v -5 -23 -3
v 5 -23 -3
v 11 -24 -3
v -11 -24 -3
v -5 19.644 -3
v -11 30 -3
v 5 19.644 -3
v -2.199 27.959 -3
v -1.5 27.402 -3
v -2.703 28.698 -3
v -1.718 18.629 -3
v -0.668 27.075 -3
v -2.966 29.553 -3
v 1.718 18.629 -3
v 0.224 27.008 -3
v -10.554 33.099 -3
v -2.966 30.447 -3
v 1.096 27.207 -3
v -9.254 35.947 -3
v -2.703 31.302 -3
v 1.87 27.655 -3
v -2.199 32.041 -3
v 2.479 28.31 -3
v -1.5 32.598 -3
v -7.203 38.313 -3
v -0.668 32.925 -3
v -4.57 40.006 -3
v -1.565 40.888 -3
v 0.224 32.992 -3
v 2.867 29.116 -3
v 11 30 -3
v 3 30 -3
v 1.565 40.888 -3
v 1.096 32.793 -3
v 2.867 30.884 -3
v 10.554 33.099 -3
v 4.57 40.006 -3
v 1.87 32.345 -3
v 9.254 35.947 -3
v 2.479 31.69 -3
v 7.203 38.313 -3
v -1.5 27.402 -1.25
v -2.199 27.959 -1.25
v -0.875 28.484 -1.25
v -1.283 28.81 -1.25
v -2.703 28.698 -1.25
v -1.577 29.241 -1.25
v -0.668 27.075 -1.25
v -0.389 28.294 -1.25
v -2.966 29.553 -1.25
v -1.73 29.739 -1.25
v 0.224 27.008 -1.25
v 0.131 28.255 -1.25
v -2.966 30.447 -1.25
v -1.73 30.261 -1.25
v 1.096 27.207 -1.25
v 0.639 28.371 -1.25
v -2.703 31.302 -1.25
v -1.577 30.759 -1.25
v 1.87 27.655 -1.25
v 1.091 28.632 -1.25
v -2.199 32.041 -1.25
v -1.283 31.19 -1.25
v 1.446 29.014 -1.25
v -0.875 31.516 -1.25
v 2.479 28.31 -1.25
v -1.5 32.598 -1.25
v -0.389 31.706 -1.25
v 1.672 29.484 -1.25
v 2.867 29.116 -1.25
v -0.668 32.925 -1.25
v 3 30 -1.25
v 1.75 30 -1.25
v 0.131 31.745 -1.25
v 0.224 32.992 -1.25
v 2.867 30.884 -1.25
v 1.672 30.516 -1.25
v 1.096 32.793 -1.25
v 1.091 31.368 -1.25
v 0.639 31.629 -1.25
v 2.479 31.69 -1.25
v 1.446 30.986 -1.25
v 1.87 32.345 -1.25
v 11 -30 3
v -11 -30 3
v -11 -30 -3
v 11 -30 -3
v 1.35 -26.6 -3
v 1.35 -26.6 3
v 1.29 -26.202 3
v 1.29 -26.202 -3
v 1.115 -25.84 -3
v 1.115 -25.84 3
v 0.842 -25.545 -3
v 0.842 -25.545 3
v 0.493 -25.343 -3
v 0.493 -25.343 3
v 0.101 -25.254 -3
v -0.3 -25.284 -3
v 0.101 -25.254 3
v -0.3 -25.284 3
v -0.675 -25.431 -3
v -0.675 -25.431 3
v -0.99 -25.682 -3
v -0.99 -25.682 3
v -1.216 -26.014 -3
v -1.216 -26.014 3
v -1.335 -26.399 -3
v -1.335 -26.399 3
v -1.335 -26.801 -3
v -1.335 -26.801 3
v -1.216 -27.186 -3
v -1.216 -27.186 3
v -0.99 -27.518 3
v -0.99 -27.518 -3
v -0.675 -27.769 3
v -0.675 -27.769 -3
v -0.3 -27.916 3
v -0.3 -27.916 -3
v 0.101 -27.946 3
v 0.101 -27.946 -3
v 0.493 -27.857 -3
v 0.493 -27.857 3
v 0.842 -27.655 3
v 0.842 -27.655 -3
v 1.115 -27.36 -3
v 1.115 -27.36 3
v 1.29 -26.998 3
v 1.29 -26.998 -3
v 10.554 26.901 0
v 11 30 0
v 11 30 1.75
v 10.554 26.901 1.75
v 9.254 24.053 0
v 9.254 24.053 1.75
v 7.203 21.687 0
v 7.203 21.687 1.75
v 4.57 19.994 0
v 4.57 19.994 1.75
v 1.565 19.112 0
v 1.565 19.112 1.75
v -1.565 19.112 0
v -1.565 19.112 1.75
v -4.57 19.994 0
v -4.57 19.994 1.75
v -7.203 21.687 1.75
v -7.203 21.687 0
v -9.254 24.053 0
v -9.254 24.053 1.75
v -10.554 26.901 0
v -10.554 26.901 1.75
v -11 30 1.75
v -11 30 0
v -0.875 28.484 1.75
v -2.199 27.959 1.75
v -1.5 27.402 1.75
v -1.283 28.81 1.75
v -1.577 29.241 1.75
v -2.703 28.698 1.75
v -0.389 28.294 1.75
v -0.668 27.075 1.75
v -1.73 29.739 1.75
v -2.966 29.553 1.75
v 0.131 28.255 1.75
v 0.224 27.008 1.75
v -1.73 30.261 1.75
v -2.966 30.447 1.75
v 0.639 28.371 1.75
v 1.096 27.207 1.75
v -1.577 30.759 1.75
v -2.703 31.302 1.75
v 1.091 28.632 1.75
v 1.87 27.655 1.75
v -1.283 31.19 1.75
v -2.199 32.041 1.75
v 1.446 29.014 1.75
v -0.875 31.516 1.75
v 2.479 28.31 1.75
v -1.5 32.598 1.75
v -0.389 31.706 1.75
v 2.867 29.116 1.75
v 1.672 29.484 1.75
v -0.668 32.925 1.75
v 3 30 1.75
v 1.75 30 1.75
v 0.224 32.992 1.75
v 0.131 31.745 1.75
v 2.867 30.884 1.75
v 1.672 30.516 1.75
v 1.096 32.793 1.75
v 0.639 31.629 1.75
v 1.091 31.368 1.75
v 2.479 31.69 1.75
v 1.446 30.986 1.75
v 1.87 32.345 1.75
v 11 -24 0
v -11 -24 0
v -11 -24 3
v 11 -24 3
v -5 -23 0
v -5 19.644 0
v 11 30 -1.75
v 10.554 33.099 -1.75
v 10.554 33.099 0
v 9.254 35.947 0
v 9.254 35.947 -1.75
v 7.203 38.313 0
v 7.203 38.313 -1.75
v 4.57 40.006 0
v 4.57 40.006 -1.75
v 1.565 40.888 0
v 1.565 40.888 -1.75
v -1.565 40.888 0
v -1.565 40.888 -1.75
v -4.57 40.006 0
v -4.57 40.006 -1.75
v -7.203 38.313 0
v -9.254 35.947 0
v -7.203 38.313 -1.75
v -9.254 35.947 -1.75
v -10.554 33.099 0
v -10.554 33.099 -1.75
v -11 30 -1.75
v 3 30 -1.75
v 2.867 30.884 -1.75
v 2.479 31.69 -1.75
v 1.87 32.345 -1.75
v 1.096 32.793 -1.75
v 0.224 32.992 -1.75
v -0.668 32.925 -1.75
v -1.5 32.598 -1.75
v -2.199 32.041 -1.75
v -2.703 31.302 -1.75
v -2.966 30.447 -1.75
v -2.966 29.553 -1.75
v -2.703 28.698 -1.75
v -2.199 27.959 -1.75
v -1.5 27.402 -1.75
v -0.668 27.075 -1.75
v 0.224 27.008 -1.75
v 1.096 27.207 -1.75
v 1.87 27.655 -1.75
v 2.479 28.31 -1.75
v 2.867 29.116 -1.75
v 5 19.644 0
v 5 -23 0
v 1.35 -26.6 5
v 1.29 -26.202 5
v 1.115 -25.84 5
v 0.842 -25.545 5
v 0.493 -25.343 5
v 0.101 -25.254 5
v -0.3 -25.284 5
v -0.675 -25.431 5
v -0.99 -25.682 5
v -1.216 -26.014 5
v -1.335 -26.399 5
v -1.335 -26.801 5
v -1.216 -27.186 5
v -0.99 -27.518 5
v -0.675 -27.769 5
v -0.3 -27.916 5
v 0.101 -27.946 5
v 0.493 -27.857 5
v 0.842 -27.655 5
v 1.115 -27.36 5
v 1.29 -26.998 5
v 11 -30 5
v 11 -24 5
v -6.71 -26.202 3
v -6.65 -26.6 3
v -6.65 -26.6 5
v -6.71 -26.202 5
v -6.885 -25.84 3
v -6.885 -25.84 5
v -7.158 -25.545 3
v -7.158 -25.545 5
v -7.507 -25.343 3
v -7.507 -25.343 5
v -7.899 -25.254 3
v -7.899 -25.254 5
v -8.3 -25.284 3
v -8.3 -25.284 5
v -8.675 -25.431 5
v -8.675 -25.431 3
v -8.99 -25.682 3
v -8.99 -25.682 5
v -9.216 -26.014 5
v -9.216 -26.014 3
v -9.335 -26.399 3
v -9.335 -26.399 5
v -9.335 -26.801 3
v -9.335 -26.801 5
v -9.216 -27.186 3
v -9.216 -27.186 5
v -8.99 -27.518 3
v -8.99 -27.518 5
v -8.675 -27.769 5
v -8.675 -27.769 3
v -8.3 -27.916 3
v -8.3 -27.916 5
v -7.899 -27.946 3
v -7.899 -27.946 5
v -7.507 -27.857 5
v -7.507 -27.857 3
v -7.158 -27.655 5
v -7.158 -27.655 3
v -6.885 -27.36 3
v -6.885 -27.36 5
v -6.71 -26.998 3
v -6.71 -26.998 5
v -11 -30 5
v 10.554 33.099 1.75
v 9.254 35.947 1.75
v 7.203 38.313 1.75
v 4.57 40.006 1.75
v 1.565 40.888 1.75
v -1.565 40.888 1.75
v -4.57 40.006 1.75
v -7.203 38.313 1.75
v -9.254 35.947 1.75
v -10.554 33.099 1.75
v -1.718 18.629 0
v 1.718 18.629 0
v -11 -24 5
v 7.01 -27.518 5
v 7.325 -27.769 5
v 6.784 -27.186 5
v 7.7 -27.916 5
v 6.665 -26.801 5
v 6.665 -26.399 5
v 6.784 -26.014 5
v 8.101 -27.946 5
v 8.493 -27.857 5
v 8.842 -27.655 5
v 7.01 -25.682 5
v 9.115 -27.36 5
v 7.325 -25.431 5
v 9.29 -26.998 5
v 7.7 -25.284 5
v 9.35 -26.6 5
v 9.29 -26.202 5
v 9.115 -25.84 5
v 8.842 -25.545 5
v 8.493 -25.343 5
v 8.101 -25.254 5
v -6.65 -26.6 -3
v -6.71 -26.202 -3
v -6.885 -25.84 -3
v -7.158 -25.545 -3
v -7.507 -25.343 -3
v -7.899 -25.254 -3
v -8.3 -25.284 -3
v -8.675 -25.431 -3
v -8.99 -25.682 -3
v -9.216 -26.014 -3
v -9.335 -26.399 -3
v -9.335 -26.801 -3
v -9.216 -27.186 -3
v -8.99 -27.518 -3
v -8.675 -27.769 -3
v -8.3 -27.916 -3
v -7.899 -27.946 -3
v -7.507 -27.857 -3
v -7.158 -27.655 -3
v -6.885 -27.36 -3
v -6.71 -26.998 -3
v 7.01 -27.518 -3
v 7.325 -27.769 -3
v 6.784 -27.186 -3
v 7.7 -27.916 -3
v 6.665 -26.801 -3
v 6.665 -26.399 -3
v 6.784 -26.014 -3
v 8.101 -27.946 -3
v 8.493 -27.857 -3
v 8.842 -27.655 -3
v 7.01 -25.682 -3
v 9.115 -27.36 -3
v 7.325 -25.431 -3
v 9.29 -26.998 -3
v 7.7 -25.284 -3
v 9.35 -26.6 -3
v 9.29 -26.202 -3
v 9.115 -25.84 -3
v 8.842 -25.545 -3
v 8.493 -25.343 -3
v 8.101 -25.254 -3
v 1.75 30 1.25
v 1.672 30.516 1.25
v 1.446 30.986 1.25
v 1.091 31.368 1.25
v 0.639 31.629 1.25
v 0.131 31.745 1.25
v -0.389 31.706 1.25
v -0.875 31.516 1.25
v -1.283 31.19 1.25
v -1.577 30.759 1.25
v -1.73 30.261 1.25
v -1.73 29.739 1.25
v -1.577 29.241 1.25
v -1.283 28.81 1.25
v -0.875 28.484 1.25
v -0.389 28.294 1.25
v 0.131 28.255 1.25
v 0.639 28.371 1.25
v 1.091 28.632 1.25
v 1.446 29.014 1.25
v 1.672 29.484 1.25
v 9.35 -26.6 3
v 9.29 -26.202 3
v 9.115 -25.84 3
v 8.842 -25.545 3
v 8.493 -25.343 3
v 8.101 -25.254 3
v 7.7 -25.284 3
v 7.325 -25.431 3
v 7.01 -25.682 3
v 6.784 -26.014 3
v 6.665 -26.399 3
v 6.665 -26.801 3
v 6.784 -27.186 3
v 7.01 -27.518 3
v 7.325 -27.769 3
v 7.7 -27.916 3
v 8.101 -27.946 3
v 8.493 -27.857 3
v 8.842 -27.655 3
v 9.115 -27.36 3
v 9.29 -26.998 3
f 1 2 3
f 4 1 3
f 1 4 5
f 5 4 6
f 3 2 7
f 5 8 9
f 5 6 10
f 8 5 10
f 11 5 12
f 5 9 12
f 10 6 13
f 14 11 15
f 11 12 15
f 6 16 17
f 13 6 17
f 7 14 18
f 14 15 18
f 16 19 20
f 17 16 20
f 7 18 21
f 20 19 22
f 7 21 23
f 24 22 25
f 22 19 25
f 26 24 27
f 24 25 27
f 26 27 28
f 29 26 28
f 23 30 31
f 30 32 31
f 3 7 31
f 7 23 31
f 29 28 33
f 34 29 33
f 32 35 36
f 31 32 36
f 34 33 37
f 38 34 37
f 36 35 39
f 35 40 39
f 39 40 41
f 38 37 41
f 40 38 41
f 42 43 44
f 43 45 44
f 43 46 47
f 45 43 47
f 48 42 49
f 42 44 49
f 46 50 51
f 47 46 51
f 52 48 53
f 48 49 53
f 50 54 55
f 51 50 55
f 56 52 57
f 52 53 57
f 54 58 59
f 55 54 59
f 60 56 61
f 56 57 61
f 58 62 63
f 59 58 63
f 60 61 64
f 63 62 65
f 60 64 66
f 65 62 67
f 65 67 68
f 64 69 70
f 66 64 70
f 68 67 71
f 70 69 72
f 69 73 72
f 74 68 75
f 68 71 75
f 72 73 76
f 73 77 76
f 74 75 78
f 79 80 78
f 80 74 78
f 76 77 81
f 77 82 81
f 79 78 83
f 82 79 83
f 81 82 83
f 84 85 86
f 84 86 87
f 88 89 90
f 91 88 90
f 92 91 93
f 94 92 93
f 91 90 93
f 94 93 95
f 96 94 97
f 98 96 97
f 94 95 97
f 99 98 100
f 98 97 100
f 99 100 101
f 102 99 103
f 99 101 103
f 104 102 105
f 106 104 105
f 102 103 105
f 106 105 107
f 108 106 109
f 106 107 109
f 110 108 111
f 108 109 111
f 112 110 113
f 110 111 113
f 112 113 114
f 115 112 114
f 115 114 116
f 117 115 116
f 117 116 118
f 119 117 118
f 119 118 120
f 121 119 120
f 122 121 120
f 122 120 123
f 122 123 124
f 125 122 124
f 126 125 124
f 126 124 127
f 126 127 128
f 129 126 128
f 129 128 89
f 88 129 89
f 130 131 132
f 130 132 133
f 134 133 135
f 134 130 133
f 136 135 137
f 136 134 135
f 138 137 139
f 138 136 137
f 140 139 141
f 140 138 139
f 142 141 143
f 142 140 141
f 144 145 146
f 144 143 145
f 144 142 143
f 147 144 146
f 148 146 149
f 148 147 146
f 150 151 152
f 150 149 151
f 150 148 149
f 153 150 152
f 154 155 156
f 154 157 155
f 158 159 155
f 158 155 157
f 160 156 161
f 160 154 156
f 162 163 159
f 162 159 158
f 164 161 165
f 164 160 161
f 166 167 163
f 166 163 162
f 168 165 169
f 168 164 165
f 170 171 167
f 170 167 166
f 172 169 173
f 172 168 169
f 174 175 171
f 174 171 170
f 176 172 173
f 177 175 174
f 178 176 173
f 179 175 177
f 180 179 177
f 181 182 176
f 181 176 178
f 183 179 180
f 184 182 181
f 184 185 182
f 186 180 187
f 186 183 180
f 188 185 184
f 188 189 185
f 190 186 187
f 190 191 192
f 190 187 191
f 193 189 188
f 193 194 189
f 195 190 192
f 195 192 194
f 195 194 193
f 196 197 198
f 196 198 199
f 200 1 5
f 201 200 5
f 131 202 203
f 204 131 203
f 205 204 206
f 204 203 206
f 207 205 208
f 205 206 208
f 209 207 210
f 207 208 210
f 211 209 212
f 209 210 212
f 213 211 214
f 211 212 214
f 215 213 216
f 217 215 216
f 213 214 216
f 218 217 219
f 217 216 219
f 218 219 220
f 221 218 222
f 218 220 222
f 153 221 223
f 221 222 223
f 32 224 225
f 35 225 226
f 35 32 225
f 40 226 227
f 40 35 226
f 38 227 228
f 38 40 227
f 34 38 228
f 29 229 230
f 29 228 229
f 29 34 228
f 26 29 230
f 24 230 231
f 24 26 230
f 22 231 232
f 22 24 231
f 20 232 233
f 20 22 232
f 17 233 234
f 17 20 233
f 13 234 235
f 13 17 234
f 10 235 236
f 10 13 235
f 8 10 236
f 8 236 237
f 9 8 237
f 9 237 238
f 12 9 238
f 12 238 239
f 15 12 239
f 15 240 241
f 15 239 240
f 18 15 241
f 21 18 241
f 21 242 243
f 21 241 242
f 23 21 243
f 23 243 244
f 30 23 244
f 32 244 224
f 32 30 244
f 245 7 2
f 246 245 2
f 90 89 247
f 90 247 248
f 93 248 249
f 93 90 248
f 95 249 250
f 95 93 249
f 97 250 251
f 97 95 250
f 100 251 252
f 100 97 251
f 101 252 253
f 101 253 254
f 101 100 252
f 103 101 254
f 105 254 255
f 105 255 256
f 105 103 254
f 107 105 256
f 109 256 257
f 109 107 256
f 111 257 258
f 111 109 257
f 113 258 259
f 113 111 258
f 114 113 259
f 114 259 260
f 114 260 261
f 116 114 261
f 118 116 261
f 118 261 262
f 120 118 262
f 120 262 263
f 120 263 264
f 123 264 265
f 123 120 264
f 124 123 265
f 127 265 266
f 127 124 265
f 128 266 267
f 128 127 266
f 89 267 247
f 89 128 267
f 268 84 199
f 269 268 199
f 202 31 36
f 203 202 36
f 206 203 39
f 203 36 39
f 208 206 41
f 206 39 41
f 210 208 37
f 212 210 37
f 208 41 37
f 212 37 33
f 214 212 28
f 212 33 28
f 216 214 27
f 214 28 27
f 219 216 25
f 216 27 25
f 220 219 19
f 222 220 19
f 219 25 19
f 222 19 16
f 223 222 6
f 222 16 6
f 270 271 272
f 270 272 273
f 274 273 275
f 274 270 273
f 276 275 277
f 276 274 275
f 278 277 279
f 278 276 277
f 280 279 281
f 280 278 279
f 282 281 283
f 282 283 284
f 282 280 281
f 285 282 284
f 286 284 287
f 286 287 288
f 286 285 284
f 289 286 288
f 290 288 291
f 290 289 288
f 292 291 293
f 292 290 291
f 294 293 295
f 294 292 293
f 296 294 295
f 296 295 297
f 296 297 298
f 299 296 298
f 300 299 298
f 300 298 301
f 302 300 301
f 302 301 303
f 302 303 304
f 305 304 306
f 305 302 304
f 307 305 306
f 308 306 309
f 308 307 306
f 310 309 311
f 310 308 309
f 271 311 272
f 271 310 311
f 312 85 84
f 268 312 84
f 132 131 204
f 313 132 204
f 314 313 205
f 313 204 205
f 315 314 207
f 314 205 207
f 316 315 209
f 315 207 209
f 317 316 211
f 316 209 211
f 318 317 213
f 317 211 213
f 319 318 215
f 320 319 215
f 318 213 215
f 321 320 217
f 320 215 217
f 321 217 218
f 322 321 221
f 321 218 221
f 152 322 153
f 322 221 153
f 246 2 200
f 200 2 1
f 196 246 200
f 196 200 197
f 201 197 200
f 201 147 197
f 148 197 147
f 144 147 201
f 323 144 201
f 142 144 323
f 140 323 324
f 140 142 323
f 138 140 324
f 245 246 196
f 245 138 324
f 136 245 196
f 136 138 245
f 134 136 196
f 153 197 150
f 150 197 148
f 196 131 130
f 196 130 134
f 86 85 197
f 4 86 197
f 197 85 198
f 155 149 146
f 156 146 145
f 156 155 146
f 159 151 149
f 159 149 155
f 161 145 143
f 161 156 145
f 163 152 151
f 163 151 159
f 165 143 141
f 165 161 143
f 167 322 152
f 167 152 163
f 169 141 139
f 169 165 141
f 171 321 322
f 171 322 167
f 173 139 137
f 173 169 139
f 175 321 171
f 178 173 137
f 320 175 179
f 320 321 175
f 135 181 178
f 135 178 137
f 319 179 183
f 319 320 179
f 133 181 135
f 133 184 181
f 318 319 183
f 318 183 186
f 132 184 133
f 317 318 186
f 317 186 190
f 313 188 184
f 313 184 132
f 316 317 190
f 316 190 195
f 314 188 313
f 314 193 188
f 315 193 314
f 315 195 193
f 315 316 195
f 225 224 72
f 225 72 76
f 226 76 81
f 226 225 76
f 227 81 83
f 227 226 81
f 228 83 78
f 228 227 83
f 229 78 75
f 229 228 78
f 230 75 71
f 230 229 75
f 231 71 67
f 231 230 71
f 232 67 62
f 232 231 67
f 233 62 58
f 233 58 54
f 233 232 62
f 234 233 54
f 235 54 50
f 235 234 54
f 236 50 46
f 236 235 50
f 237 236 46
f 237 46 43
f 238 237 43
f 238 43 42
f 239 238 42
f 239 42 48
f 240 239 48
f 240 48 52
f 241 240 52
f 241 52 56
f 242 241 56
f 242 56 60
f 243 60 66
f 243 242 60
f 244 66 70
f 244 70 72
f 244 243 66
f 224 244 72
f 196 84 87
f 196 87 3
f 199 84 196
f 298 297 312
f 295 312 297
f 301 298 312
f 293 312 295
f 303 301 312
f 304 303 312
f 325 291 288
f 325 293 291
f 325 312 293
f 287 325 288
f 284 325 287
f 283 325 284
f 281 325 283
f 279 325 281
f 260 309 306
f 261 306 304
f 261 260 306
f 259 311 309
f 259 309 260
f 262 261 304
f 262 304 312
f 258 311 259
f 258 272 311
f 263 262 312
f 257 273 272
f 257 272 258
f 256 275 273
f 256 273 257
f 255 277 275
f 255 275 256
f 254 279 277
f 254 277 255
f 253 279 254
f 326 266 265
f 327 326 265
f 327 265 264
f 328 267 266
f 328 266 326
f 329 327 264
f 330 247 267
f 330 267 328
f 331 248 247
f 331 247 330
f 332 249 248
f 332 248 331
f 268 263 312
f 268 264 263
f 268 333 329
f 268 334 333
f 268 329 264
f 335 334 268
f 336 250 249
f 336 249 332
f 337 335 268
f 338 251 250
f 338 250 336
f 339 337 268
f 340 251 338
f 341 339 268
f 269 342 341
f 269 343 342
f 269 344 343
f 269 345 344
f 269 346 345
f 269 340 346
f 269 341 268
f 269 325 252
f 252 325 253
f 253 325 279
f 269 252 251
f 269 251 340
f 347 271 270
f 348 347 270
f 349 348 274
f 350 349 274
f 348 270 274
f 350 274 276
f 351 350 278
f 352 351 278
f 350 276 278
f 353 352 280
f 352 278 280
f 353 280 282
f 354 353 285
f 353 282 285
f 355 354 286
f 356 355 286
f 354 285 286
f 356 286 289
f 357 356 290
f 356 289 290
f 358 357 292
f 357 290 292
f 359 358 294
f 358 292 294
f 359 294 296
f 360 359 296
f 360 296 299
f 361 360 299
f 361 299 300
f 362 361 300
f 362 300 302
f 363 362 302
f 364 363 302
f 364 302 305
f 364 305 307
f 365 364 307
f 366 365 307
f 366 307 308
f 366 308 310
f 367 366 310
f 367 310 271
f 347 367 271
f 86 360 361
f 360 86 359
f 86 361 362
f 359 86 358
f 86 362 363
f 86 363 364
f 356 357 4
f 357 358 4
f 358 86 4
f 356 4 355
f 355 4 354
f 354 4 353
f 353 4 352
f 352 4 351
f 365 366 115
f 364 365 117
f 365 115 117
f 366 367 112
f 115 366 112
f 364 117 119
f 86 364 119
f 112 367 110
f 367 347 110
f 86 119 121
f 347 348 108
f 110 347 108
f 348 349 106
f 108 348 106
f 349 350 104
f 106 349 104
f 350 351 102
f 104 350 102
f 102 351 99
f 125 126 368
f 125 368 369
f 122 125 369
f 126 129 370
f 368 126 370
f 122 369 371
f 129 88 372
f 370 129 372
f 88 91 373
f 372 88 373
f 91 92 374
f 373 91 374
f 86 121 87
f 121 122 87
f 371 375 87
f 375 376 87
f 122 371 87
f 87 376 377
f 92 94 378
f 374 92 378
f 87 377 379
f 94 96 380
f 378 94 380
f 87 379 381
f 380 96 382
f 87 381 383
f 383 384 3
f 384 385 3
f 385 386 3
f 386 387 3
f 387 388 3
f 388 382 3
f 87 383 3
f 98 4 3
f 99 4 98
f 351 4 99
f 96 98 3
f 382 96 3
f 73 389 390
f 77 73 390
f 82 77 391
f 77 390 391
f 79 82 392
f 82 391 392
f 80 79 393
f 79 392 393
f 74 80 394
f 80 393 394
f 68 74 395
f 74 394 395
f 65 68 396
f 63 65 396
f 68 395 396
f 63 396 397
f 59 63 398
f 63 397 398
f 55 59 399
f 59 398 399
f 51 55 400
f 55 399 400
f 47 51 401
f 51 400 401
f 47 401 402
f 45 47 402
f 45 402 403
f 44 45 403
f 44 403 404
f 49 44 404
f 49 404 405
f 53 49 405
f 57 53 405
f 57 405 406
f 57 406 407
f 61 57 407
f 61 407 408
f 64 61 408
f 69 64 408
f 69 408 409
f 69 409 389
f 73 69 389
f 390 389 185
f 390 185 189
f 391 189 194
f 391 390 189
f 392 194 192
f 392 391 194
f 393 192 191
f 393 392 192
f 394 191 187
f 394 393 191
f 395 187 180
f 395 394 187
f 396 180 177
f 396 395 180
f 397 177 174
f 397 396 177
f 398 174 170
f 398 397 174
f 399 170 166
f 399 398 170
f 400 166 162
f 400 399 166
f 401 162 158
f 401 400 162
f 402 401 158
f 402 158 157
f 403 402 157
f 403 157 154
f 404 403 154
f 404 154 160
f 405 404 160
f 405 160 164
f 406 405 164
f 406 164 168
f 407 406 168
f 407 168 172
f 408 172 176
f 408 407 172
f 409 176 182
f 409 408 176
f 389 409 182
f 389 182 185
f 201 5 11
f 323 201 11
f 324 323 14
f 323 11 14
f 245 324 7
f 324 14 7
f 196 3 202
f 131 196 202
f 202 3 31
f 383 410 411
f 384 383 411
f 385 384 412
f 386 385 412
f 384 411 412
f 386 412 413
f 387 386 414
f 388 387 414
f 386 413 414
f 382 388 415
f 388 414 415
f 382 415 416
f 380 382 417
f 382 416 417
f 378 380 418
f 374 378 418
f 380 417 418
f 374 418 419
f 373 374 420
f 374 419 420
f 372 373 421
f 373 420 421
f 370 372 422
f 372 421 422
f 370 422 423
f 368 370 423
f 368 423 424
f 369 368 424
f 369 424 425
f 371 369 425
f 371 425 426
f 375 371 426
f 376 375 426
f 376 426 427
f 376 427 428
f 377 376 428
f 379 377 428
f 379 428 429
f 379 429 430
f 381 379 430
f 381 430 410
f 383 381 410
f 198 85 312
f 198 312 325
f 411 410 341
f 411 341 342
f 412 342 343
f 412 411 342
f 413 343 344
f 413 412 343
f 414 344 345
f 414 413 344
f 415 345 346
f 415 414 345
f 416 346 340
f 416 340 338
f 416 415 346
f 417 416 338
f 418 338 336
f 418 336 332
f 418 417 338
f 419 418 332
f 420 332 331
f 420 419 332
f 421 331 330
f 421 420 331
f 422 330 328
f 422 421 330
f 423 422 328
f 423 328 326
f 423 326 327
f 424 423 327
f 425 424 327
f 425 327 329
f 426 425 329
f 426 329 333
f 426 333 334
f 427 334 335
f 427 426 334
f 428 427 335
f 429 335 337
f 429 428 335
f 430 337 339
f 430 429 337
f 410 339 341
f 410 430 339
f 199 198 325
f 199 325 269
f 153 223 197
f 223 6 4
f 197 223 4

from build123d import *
from build123d.topology import SkipClean

# Parameters (mm, degrees)
BOSS_EXTRUDE1_DEPTH           = 3
BOSS_EXTRUDE2_START           = -1.75
SKETCH1_3_R                   = 11
BOSS_EXTRUDE2_DEPTH           = 1.75
SKETCH2_R                     = 1.75
CUT_EXTRUDE1_DEPTH            = 4.75
SKETCH2_3_R                   = 3
CUT_EXTRUDE2_DEPTH            = 1.75
SKETCH1_6_W                   = 11
SKETCH1_6_H                   = 6
BOSS_EXTRUDE3_DEPTH           = 5
SKETCH3_R                     = 1.35
CUT_EXTRUDE3_DEPTH            = 8
LPATTERN1_COUNT               = 2
LPATTERN1_PITCH               = 8
LPATTERN1_COL_COUNT           = 2
LPATTERN1_COL_PITCH           = 8
BODY_MOVE_COPY1_START         = -3
BODY_MOVE_COPY1_OUTLINE_R     = 3
BODY_MOVE_COPY1_DEPTH         = 3
BODY_MOVE_COPY1_START_2       = 3
BODY_MOVE_COPY1_2_OUTLINE_W   = 22
BODY_MOVE_COPY1_2_OUTLINE_H   = 6
BODY_MOVE_COPY1_2_OUTLINE_R   = 1.35
BODY_MOVE_COPY1_2_DEPTH       = 2
BODY_MOVE_COPY1_START_3       = 1.25
BODY_MOVE_COPY1_3_OUTLINE_R   = 3
BODY_MOVE_COPY1_3_OUTLINE_R_2 = 1.75
BODY_MOVE_COPY1_3_DEPTH       = 0.5
BODY_MOVE_COPY1_4_DEPTH       = 3
BODY_MOVE_COPY1_START_4       = 1.75
BODY_MOVE_COPY1_5_OUTLINE_R   = 11
BODY_MOVE_COPY1_5_OUTLINE_R_2 = 3
BODY_MOVE_COPY1_5_DEPTH       = 1.25
BODY_MOVE_COPY1_START_5       = -5
BODY_MOVE_COPY1_6_OUTLINE_W   = 22
BODY_MOVE_COPY1_6_OUTLINE_H   = 6
BODY_MOVE_COPY1_6_OUTLINE_R   = 1.35
BODY_MOVE_COPY1_6_DEPTH       = 2
BODY_MOVE_COPY1_START_6       = -1.75
BODY_MOVE_COPY1_7_OUTLINE_R   = 3
BODY_MOVE_COPY1_7_OUTLINE_R_2 = 1.75
BODY_MOVE_COPY1_7_DEPTH       = 0.5


# Read off the part's stored shape, not the designer's step: Body-Move/Copy1
with BuildPart() as part:
    # Sketch1 → Boss-Extrude1 (new body)
    with BuildSketch(Plane.XY):
        with BuildLine():
            Line((-11, 30), (-11, -30))
            Line((-11, -30), (11, -30))
            Line((11, -30), (11, 30))
            ThreePointArc((11, 30), (0, 41), (-11, 30))
        make_face()
        with BuildLine():
            Line((5, -23), (-5, -23))
            Line((-5, -23), (-5, 19.643842411))
            ThreePointArc((-5, 19.643842411), (0, 18.5), (5, 19.643842411))
            Line((5, 19.643842411), (5, -23))
        make_face(mode=Mode.SUBTRACT)
    extrude(amount=BOSS_EXTRUDE1_DEPTH)

    # Sketch1<3> → Boss-Extrude2 (add)
    with BuildSketch(Plane.XY.offset(BOSS_EXTRUDE2_START)):
        with Locations((0, 30)):
            Circle(SKETCH1_3_R)
    extrude(amount=BOSS_EXTRUDE2_DEPTH)

    # Sketch2 → Cut-Extrude1 (cut)
    with BuildSketch(Plane.XY.offset(3)):
        with Locations((0, 30)):
            Circle(SKETCH2_R)
    extrude(amount=-CUT_EXTRUDE1_DEPTH, mode=Mode.SUBTRACT)

    # Sketch2<3> → Cut-Extrude2 (cut)
    with BuildSketch(Plane.XY.offset(3)):
        with Locations((0, 30)):
            Circle(SKETCH2_3_R)
    extrude(amount=-CUT_EXTRUDE2_DEPTH, mode=Mode.SUBTRACT)

    # Sketch1<6> → Boss-Extrude3 (add)
    with BuildSketch(Plane.XY):
        with Locations((5.5, -27)):
            Rectangle(SKETCH1_6_W, SKETCH1_6_H)
        with Locations((-5.5, -27)):
            Rectangle(SKETCH1_6_W, SKETCH1_6_H)
    extrude(amount=-BOSS_EXTRUDE3_DEPTH)

    # Sketch3 → Cut-Extrude3 (cut)
    with BuildSketch(Plane.XY.offset(3)):
        with Locations((0, -26.6)):
            Circle(SKETCH3_R)
    cut_extrude3 = extrude(amount=-CUT_EXTRUDE3_DEPTH, mode=Mode.SUBTRACT)

    # LPattern1: Cut-Extrude3 ×2
    with Locations(*[(i * LPATTERN1_PITCH, 0, 0) for i in range(1, LPATTERN1_COUNT)]):
        add(cut_extrude3, mode=Mode.SUBTRACT)

    # LPattern1 col: Cut-Extrude3 ×2
    with Locations(*[(-i * LPATTERN1_COL_PITCH, 0, 0) for i in range(1, LPATTERN1_COL_COUNT)]):
        add(cut_extrude3, mode=Mode.SUBTRACT)

    # Body-Move/Copy1 outline → Body-Move/Copy1 (add)
    with BuildSketch(Plane.XY.offset(BODY_MOVE_COPY1_START)):
        with BuildLine():
            Line((-11, 30), (-11, -24))
            Line((-11, -24), (11, -24))
            Line((11, -24), (11, 30))
            ThreePointArc((11, 30), (0, 41), (-11, 30))
        make_face()
        with BuildLine():
            Line((-5, -23), (-5, 19.643842411))
            ThreePointArc((-5, 19.643842411), (0, 18.5), (5, 19.643842411))
            Line((5, 19.643842411), (5, -23))
            Line((5, -23), (-5, -23))
        make_face(mode=Mode.SUBTRACT)
        with Locations((0, 30)):
            Circle(BODY_MOVE_COPY1_OUTLINE_R, mode=Mode.SUBTRACT)
    extrude(amount=BODY_MOVE_COPY1_DEPTH)

    # Body-Move_Copy1 2 outline → Body-Move_Copy1 2 (add)
    with BuildSketch(Plane.XY.offset(BODY_MOVE_COPY1_START_2)):
        with Locations((0, -27)):
            Rectangle(BODY_MOVE_COPY1_2_OUTLINE_W, BODY_MOVE_COPY1_2_OUTLINE_H)
        with Locations((-8, -26.6)):
            Circle(BODY_MOVE_COPY1_2_OUTLINE_R, mode=Mode.SUBTRACT)
        with Locations((0, -26.6)):
            Circle(BODY_MOVE_COPY1_2_OUTLINE_R, mode=Mode.SUBTRACT)
        with Locations((8, -26.6)):
            Circle(BODY_MOVE_COPY1_2_OUTLINE_R, mode=Mode.SUBTRACT)
    extrude(amount=BODY_MOVE_COPY1_2_DEPTH)

    # Body-Move_Copy1 3 outline → Body-Move_Copy1 3 (add)
    with BuildSketch(Plane.XY.offset(BODY_MOVE_COPY1_START_3)):
        with Locations((0, 30)):
            Circle(BODY_MOVE_COPY1_3_OUTLINE_R)
        with Locations((0, 30)):
            Circle(BODY_MOVE_COPY1_3_OUTLINE_R_2, mode=Mode.SUBTRACT)
    extrude(amount=BODY_MOVE_COPY1_3_DEPTH)

    # Body-Move_Copy1 4 outline → Body-Move_Copy1 4 (cut)
    with SkipClean():  # the faces are left unmerged after this step: merging them gives an invalid solid
        with BuildSketch(Plane.XY):
            with BuildLine():
                Line((-11, 30), (-11, -24))
                Line((-11, -24), (11, -24))
                Line((11, -24), (11, 30))
                ThreePointArc((11, 30), (0, 19), (-11, 30))
            make_face()
            with BuildLine():
                Line((-5, -23), (-5, 19.643842411))
                ThreePointArc((-5, 19.643842411), (0, 18.5), (5, 19.643842411))
                Line((5, 19.643842411), (5, -23))
                Line((5, -23), (-5, -23))
            make_face(mode=Mode.SUBTRACT)
        extrude(amount=BODY_MOVE_COPY1_4_DEPTH, mode=Mode.SUBTRACT)

    # Body-Move_Copy1 5 outline → Body-Move_Copy1 5 (cut)
    with BuildSketch(Plane.XY.offset(BODY_MOVE_COPY1_START_4)):
        with Locations((0, 30)):
            Circle(BODY_MOVE_COPY1_5_OUTLINE_R)
        with Locations((0, 30)):
            Circle(BODY_MOVE_COPY1_5_OUTLINE_R_2, mode=Mode.SUBTRACT)
    extrude(amount=BODY_MOVE_COPY1_5_DEPTH, mode=Mode.SUBTRACT)

    # Body-Move_Copy1 6 outline → Body-Move_Copy1 6 (cut)
    with BuildSketch(Plane.XY.offset(BODY_MOVE_COPY1_START_5)):
        with Locations((0, -27)):
            Rectangle(BODY_MOVE_COPY1_6_OUTLINE_W, BODY_MOVE_COPY1_6_OUTLINE_H)
        with Locations((-8, -26.6)):
            Circle(BODY_MOVE_COPY1_6_OUTLINE_R, mode=Mode.SUBTRACT)
        with Locations((0, -26.6)):
            Circle(BODY_MOVE_COPY1_6_OUTLINE_R, mode=Mode.SUBTRACT)
        with Locations((8, -26.6)):
            Circle(BODY_MOVE_COPY1_6_OUTLINE_R, mode=Mode.SUBTRACT)
    extrude(amount=BODY_MOVE_COPY1_6_DEPTH, mode=Mode.SUBTRACT)

    # Body-Move_Copy1 7 outline → Body-Move_Copy1 7 (cut)
    with BuildSketch(Plane.XY.offset(BODY_MOVE_COPY1_START_6)):
        with Locations((0, 30)):
            Circle(BODY_MOVE_COPY1_7_OUTLINE_R)
        with Locations((0, 30)):
            Circle(BODY_MOVE_COPY1_7_OUTLINE_R_2, mode=Mode.SUBTRACT)
    extrude(amount=BODY_MOVE_COPY1_7_DEPTH, mode=Mode.SUBTRACT)


solid = part.part
